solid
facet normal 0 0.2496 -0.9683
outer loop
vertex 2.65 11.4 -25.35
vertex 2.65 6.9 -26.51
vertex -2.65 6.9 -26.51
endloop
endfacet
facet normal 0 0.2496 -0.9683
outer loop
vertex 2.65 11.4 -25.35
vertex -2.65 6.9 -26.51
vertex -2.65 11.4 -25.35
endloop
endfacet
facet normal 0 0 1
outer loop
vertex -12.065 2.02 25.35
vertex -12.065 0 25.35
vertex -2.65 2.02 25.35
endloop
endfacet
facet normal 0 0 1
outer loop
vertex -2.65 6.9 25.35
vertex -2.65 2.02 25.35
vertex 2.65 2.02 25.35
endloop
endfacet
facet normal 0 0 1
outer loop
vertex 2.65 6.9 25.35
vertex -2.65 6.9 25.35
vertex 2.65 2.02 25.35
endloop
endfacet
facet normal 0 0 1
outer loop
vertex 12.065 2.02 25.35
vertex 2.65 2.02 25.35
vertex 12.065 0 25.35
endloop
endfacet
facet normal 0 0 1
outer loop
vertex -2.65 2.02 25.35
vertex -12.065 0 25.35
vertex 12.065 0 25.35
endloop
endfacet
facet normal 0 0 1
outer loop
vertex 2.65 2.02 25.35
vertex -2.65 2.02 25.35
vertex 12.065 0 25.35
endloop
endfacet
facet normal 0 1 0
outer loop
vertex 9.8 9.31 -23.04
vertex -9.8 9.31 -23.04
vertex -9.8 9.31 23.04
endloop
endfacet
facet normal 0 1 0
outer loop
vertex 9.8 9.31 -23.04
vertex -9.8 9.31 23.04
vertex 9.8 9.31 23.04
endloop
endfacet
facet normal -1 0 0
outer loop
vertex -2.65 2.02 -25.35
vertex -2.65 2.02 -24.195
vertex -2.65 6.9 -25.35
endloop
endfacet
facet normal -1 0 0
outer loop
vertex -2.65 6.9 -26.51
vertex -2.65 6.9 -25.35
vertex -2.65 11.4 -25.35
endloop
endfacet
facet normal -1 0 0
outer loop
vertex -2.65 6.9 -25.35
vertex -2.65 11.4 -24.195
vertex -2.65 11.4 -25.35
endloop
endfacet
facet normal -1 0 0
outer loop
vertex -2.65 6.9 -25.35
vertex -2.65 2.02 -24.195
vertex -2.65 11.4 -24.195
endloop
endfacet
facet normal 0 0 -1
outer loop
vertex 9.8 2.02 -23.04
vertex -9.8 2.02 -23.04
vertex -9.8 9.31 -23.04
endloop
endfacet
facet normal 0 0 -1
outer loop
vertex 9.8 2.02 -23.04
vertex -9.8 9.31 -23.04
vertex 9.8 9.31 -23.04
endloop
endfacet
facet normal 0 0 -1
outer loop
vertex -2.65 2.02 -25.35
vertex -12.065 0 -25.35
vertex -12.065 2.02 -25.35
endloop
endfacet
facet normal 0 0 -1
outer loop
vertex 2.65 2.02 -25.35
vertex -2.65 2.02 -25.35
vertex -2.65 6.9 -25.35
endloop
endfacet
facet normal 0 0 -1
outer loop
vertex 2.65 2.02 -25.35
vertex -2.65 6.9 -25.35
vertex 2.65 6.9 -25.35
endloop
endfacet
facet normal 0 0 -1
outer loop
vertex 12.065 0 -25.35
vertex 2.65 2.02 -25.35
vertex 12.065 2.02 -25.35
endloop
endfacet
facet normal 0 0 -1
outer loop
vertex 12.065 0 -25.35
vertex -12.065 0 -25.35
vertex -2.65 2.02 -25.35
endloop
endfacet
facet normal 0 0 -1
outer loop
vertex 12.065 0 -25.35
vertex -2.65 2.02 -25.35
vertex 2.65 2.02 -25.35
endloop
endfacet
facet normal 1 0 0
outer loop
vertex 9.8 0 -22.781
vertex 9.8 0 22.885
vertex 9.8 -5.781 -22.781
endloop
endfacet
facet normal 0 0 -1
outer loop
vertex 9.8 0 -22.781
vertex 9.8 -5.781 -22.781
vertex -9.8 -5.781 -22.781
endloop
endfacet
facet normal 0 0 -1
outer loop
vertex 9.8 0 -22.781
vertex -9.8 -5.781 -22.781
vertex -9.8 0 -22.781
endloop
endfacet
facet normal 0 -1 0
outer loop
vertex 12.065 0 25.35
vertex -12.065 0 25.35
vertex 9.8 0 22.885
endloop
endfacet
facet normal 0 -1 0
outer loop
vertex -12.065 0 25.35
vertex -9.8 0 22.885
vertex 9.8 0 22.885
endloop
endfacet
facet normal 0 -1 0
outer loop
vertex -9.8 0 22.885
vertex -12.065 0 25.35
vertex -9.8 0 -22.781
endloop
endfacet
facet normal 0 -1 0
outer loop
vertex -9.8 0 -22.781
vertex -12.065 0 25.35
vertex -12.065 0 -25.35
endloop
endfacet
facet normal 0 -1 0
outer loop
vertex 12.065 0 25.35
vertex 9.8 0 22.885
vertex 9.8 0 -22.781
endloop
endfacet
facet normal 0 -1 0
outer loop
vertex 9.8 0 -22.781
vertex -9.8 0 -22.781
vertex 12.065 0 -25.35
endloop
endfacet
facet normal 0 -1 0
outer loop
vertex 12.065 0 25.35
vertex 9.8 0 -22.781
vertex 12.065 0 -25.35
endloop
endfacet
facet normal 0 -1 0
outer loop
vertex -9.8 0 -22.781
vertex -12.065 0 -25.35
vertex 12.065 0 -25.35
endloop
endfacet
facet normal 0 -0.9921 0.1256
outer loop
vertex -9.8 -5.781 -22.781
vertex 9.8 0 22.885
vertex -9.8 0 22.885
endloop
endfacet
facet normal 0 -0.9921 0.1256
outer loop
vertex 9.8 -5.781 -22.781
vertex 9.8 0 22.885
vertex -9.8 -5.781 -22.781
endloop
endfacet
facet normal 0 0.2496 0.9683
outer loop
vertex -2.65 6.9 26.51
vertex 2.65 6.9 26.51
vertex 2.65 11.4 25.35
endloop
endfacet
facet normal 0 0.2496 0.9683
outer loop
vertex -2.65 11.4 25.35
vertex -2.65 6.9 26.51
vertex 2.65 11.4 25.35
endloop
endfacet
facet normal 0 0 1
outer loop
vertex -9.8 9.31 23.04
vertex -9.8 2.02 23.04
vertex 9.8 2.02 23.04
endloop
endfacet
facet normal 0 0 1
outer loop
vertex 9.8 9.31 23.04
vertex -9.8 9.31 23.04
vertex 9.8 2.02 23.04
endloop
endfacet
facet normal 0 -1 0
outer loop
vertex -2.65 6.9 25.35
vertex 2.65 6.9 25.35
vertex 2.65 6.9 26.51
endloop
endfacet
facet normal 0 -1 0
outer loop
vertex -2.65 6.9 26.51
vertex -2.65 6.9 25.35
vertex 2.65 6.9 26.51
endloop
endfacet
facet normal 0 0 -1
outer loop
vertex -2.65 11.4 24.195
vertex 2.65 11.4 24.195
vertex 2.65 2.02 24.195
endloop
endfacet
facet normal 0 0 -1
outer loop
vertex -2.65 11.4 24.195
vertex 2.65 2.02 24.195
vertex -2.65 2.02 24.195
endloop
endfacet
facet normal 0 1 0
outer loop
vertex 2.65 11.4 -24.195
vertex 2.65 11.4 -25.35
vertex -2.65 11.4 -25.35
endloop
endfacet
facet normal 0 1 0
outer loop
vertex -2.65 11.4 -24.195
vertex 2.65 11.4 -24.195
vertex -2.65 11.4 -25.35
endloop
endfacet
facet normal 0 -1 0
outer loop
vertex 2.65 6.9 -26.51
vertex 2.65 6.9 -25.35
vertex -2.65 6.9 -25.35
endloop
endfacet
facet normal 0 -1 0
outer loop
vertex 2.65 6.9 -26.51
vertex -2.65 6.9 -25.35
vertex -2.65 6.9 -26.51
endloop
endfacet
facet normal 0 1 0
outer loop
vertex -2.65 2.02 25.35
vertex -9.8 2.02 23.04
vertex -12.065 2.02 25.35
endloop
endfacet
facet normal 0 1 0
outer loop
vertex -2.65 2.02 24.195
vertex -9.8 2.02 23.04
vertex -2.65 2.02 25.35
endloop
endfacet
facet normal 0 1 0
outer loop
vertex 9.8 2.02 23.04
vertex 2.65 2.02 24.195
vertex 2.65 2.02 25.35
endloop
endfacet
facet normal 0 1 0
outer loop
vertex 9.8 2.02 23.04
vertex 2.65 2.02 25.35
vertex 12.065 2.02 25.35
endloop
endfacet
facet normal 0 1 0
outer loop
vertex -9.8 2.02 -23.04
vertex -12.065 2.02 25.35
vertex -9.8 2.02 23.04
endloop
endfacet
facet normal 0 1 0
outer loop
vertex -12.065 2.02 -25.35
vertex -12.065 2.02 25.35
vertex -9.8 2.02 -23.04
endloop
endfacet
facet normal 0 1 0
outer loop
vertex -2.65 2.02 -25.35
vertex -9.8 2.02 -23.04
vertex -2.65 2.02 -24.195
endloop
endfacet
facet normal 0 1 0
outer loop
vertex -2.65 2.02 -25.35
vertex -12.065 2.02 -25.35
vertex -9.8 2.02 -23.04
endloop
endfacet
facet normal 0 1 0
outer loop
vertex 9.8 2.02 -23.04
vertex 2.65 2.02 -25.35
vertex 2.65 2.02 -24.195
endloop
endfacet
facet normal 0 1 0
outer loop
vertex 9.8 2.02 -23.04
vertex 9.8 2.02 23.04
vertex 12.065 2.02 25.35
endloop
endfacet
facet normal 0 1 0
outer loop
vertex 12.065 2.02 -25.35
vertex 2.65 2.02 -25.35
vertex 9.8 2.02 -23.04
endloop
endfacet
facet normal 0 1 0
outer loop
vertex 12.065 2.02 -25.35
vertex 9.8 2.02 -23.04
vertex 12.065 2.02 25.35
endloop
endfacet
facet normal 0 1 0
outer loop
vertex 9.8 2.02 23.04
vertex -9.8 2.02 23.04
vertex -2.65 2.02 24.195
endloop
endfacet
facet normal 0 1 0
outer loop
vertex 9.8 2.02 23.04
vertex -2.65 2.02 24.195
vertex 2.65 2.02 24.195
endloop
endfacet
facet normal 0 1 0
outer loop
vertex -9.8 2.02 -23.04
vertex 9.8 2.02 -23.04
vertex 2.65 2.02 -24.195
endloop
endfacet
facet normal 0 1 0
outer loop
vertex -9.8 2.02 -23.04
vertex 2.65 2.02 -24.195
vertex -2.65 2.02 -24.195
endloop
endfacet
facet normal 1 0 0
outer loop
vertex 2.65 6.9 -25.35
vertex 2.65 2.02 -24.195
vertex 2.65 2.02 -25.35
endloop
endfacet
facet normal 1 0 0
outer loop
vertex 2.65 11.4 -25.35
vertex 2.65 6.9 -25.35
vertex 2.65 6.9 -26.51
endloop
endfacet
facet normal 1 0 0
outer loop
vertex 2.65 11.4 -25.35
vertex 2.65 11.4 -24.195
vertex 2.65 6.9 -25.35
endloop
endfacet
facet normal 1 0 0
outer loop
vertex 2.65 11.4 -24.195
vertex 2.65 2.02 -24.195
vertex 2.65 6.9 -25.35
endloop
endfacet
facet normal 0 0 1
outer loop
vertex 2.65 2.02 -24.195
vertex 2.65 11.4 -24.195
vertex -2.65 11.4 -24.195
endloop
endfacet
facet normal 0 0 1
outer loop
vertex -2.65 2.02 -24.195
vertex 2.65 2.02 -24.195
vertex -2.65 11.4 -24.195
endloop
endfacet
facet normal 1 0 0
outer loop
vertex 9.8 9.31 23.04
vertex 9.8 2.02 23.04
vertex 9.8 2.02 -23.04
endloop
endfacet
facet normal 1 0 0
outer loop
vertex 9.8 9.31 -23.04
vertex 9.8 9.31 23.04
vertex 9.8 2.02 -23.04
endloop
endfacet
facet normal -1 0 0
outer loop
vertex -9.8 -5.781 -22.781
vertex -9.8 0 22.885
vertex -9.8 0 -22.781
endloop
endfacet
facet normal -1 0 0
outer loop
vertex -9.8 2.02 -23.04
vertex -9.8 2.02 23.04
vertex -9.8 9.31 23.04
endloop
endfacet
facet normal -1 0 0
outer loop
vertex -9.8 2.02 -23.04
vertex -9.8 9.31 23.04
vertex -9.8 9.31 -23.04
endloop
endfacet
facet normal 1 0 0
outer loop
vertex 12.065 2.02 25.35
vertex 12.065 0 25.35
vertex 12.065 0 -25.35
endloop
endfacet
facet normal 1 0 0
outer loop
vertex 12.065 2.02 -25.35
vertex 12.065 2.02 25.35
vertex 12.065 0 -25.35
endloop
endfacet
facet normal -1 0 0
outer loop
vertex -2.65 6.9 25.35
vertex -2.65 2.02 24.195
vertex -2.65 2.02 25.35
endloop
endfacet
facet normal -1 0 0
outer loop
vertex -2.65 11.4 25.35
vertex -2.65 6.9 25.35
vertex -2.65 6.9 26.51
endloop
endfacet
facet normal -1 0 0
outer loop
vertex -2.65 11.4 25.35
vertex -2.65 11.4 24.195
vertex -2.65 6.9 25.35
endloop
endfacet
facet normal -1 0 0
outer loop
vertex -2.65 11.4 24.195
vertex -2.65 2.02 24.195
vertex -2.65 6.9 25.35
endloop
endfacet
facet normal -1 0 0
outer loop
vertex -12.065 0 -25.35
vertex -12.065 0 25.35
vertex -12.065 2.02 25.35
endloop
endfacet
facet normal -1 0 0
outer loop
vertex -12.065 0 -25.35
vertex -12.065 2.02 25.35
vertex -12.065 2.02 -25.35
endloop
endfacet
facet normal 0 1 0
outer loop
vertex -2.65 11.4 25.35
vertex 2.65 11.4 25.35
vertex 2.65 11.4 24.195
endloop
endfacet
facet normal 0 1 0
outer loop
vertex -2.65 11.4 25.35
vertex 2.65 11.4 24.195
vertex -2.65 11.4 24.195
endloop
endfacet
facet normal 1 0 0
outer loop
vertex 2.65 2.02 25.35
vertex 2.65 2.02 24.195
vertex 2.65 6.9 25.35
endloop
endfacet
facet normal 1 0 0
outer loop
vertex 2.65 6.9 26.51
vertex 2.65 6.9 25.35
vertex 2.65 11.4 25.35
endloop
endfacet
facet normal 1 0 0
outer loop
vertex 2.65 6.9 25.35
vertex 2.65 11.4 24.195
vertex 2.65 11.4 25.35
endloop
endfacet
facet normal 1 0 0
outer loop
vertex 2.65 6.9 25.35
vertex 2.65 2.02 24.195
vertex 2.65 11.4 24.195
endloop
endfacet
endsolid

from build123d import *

# Parameters (mm, degrees)
SKETCH1_W           = 24.13
SKETCH1_H           = 50.7
BOSS_EXTRUDE1_DEPTH = 2.02
SKETCH2_W           = 19.6
SKETCH2_H           = 46.08
BOSS_EXTRUDE2_DEPTH = 7.29
BOSS_EXTRUDE3_START = -2.265
BOSS_EXTRUDE3_DEPTH = 19.6
SKETCH4_W           = 5.3
SKETCH4_H           = 9.38
BOSS_EXTRUDE4_DEPTH = 1.155
BOSS_EXTRUDE5_DEPTH = 5.3


with BuildPart() as part:
    # Sketch1 → Boss-Extrude1 (new body)
    with BuildSketch(Plane(origin=(0, 0, 0), x_dir=(1, 0, 0), z_dir=(0, 1, 0))):
        Rectangle(SKETCH1_W, SKETCH1_H)
    extrude(amount=BOSS_EXTRUDE1_DEPTH)

    # Sketch2 → Boss-Extrude2 (add)
    with BuildSketch(Plane(origin=(0, 2.02, 0), x_dir=(1, 0, 0), z_dir=(0, 1, 0))):
        Rectangle(SKETCH2_W, SKETCH2_H)
    extrude(amount=BOSS_EXTRUDE2_DEPTH)

    # Sketch3 → Boss-Extrude3 (add)
    with BuildSketch(Plane(origin=(12.065, 0, 0), x_dir=(0, 0, -1), z_dir=(1, 0, 0)).offset(BOSS_EXTRUDE3_START)):
        Polygon((-22.884943392, 0), (22.781251072, -5.781035599), (22.781251072, 0), align=None)
    extrude(amount=-BOSS_EXTRUDE3_DEPTH)

    # Sketch4 → Boss-Extrude4 (add)
    with BuildSketch(Plane(origin=(0, 0, -25.35), x_dir=(-1, 0, 0), z_dir=(0, 0, -1))):
        with Locations((0, 6.71)):
            Rectangle(SKETCH4_W, SKETCH4_H)
    boss_extrude4 = extrude(amount=-BOSS_EXTRUDE4_DEPTH)

    # Sketch5 → Boss-Extrude5 (add)
    with BuildSketch(Plane(origin=(2.65, 0, 0), x_dir=(0, 0, -1), z_dir=(1, 0, 0))):
        Polygon((25.35, 11.4), (25.35, 6.9), (26.51, 6.9), align=None)
    boss_extrude5 = extrude(amount=-BOSS_EXTRUDE5_DEPTH)

    # Mirror1: Boss-Extrude4, Boss-Extrude5 across plane
    add(boss_extrude4.mirror(Plane.XY))
    add(boss_extrude5.mirror(Plane.XY))


solid = part.part
